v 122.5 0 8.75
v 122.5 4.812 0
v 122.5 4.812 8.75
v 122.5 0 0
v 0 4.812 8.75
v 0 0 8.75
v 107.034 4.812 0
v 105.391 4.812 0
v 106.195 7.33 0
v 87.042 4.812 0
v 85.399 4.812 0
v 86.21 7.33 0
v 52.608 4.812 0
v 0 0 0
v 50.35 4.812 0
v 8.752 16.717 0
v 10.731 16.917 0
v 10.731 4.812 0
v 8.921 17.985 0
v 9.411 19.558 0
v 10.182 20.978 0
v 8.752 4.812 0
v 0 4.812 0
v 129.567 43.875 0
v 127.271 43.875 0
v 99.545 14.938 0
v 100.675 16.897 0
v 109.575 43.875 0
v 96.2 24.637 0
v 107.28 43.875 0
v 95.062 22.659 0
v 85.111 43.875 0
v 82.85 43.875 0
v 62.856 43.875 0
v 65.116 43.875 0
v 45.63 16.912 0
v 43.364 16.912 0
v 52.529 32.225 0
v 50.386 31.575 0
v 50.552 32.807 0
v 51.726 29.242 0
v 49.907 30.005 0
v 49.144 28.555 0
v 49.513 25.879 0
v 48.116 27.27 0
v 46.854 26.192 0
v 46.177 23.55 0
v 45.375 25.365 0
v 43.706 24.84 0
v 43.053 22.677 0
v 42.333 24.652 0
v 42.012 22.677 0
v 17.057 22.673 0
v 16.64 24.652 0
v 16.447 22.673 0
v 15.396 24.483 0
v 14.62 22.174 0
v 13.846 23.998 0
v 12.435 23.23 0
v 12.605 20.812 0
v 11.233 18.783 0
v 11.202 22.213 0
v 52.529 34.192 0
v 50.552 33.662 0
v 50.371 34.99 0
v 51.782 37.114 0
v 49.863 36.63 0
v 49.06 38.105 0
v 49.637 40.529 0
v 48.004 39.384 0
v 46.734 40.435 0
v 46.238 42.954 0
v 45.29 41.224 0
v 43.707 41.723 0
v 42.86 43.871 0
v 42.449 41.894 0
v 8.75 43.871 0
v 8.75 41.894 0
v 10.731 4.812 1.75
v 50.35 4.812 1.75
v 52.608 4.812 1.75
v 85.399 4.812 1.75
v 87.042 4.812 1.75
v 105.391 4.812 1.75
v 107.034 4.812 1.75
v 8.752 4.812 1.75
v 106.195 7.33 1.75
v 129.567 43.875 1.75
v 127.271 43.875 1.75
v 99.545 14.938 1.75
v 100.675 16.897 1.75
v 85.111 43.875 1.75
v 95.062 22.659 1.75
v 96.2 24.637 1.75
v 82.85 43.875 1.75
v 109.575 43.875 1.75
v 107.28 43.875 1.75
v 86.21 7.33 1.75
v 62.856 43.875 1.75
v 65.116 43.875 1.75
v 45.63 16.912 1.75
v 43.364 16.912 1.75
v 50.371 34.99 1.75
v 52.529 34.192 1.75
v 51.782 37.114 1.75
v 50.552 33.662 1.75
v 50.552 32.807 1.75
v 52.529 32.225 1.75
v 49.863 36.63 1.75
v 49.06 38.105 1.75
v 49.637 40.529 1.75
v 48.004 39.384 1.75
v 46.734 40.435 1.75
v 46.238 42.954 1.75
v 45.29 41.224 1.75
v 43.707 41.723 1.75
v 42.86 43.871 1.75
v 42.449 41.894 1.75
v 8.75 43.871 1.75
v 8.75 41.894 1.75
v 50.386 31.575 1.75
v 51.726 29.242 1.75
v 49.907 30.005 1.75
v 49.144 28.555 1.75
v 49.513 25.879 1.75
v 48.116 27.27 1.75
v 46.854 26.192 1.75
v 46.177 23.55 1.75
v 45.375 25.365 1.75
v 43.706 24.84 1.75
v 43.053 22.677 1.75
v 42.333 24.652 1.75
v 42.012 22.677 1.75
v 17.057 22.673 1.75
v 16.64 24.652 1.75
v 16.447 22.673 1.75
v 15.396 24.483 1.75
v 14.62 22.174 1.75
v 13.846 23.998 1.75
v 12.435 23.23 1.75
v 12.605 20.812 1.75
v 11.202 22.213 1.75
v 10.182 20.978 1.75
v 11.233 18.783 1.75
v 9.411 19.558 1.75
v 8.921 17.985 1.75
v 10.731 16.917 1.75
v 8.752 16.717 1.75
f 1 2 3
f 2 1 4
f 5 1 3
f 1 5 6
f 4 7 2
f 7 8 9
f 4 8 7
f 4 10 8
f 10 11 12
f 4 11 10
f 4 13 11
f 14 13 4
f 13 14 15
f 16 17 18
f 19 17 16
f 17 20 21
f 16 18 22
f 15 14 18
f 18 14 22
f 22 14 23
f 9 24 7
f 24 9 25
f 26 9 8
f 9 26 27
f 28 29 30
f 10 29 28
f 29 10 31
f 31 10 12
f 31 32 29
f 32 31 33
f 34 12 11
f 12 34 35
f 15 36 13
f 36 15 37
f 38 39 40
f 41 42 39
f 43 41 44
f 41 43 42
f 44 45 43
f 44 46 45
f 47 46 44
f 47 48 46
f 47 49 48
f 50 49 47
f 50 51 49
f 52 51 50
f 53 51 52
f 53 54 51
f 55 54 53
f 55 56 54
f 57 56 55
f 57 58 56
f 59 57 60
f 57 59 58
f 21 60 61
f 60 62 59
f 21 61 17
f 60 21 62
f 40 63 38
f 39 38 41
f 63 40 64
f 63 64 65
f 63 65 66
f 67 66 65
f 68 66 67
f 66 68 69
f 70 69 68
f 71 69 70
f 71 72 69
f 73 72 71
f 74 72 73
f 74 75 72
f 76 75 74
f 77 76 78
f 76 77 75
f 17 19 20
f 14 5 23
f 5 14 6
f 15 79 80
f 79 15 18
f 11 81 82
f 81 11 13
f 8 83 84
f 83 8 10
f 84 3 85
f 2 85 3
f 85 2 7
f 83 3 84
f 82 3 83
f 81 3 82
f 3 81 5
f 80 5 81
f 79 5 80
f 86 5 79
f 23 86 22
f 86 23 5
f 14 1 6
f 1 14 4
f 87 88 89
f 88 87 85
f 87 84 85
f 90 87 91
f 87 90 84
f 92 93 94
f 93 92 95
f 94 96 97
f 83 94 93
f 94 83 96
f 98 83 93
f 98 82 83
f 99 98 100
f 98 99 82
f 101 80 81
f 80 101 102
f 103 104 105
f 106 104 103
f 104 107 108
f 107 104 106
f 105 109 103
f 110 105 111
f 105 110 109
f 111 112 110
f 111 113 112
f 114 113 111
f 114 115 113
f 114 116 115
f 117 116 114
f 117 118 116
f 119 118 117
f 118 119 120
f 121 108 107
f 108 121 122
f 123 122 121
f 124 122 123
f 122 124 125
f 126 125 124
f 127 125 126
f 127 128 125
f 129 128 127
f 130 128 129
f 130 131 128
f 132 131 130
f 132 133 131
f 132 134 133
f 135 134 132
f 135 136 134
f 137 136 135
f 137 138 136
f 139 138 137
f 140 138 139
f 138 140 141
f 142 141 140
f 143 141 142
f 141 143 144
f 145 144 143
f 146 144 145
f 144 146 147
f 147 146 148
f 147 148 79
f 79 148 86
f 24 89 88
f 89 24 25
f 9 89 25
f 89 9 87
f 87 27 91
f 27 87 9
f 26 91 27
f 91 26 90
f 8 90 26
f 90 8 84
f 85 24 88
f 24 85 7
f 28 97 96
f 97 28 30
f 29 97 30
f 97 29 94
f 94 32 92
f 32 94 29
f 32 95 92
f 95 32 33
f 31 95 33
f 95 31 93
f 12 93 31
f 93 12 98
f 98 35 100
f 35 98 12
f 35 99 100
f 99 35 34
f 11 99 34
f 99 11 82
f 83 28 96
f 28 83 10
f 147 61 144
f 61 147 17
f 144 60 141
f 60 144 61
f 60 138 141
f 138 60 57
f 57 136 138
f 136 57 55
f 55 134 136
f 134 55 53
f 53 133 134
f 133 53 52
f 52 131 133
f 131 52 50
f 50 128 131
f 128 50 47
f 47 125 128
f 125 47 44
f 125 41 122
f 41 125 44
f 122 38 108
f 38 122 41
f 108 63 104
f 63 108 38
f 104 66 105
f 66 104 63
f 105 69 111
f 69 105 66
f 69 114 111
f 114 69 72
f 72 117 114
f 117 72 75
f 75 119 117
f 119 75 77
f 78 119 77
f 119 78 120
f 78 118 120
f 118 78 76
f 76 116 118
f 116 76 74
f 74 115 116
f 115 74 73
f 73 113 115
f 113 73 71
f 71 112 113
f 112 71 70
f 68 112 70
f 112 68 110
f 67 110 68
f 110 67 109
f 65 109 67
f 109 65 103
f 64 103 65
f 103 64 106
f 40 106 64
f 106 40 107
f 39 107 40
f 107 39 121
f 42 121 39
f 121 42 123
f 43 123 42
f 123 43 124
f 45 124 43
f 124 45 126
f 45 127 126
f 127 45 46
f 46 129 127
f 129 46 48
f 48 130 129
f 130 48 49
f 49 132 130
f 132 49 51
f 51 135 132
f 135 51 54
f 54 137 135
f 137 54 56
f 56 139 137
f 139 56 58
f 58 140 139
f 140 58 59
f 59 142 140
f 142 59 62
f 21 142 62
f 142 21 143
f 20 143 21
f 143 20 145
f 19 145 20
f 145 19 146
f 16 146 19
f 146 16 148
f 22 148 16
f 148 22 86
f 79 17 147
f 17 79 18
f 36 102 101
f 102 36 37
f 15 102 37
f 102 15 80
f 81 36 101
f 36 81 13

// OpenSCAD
scale(1.75)union(){
    cube([70,2.75,5]);
    translate([5,2.5])linear_extrude(height = 1)
        import (file = "logo.dxf");
}
